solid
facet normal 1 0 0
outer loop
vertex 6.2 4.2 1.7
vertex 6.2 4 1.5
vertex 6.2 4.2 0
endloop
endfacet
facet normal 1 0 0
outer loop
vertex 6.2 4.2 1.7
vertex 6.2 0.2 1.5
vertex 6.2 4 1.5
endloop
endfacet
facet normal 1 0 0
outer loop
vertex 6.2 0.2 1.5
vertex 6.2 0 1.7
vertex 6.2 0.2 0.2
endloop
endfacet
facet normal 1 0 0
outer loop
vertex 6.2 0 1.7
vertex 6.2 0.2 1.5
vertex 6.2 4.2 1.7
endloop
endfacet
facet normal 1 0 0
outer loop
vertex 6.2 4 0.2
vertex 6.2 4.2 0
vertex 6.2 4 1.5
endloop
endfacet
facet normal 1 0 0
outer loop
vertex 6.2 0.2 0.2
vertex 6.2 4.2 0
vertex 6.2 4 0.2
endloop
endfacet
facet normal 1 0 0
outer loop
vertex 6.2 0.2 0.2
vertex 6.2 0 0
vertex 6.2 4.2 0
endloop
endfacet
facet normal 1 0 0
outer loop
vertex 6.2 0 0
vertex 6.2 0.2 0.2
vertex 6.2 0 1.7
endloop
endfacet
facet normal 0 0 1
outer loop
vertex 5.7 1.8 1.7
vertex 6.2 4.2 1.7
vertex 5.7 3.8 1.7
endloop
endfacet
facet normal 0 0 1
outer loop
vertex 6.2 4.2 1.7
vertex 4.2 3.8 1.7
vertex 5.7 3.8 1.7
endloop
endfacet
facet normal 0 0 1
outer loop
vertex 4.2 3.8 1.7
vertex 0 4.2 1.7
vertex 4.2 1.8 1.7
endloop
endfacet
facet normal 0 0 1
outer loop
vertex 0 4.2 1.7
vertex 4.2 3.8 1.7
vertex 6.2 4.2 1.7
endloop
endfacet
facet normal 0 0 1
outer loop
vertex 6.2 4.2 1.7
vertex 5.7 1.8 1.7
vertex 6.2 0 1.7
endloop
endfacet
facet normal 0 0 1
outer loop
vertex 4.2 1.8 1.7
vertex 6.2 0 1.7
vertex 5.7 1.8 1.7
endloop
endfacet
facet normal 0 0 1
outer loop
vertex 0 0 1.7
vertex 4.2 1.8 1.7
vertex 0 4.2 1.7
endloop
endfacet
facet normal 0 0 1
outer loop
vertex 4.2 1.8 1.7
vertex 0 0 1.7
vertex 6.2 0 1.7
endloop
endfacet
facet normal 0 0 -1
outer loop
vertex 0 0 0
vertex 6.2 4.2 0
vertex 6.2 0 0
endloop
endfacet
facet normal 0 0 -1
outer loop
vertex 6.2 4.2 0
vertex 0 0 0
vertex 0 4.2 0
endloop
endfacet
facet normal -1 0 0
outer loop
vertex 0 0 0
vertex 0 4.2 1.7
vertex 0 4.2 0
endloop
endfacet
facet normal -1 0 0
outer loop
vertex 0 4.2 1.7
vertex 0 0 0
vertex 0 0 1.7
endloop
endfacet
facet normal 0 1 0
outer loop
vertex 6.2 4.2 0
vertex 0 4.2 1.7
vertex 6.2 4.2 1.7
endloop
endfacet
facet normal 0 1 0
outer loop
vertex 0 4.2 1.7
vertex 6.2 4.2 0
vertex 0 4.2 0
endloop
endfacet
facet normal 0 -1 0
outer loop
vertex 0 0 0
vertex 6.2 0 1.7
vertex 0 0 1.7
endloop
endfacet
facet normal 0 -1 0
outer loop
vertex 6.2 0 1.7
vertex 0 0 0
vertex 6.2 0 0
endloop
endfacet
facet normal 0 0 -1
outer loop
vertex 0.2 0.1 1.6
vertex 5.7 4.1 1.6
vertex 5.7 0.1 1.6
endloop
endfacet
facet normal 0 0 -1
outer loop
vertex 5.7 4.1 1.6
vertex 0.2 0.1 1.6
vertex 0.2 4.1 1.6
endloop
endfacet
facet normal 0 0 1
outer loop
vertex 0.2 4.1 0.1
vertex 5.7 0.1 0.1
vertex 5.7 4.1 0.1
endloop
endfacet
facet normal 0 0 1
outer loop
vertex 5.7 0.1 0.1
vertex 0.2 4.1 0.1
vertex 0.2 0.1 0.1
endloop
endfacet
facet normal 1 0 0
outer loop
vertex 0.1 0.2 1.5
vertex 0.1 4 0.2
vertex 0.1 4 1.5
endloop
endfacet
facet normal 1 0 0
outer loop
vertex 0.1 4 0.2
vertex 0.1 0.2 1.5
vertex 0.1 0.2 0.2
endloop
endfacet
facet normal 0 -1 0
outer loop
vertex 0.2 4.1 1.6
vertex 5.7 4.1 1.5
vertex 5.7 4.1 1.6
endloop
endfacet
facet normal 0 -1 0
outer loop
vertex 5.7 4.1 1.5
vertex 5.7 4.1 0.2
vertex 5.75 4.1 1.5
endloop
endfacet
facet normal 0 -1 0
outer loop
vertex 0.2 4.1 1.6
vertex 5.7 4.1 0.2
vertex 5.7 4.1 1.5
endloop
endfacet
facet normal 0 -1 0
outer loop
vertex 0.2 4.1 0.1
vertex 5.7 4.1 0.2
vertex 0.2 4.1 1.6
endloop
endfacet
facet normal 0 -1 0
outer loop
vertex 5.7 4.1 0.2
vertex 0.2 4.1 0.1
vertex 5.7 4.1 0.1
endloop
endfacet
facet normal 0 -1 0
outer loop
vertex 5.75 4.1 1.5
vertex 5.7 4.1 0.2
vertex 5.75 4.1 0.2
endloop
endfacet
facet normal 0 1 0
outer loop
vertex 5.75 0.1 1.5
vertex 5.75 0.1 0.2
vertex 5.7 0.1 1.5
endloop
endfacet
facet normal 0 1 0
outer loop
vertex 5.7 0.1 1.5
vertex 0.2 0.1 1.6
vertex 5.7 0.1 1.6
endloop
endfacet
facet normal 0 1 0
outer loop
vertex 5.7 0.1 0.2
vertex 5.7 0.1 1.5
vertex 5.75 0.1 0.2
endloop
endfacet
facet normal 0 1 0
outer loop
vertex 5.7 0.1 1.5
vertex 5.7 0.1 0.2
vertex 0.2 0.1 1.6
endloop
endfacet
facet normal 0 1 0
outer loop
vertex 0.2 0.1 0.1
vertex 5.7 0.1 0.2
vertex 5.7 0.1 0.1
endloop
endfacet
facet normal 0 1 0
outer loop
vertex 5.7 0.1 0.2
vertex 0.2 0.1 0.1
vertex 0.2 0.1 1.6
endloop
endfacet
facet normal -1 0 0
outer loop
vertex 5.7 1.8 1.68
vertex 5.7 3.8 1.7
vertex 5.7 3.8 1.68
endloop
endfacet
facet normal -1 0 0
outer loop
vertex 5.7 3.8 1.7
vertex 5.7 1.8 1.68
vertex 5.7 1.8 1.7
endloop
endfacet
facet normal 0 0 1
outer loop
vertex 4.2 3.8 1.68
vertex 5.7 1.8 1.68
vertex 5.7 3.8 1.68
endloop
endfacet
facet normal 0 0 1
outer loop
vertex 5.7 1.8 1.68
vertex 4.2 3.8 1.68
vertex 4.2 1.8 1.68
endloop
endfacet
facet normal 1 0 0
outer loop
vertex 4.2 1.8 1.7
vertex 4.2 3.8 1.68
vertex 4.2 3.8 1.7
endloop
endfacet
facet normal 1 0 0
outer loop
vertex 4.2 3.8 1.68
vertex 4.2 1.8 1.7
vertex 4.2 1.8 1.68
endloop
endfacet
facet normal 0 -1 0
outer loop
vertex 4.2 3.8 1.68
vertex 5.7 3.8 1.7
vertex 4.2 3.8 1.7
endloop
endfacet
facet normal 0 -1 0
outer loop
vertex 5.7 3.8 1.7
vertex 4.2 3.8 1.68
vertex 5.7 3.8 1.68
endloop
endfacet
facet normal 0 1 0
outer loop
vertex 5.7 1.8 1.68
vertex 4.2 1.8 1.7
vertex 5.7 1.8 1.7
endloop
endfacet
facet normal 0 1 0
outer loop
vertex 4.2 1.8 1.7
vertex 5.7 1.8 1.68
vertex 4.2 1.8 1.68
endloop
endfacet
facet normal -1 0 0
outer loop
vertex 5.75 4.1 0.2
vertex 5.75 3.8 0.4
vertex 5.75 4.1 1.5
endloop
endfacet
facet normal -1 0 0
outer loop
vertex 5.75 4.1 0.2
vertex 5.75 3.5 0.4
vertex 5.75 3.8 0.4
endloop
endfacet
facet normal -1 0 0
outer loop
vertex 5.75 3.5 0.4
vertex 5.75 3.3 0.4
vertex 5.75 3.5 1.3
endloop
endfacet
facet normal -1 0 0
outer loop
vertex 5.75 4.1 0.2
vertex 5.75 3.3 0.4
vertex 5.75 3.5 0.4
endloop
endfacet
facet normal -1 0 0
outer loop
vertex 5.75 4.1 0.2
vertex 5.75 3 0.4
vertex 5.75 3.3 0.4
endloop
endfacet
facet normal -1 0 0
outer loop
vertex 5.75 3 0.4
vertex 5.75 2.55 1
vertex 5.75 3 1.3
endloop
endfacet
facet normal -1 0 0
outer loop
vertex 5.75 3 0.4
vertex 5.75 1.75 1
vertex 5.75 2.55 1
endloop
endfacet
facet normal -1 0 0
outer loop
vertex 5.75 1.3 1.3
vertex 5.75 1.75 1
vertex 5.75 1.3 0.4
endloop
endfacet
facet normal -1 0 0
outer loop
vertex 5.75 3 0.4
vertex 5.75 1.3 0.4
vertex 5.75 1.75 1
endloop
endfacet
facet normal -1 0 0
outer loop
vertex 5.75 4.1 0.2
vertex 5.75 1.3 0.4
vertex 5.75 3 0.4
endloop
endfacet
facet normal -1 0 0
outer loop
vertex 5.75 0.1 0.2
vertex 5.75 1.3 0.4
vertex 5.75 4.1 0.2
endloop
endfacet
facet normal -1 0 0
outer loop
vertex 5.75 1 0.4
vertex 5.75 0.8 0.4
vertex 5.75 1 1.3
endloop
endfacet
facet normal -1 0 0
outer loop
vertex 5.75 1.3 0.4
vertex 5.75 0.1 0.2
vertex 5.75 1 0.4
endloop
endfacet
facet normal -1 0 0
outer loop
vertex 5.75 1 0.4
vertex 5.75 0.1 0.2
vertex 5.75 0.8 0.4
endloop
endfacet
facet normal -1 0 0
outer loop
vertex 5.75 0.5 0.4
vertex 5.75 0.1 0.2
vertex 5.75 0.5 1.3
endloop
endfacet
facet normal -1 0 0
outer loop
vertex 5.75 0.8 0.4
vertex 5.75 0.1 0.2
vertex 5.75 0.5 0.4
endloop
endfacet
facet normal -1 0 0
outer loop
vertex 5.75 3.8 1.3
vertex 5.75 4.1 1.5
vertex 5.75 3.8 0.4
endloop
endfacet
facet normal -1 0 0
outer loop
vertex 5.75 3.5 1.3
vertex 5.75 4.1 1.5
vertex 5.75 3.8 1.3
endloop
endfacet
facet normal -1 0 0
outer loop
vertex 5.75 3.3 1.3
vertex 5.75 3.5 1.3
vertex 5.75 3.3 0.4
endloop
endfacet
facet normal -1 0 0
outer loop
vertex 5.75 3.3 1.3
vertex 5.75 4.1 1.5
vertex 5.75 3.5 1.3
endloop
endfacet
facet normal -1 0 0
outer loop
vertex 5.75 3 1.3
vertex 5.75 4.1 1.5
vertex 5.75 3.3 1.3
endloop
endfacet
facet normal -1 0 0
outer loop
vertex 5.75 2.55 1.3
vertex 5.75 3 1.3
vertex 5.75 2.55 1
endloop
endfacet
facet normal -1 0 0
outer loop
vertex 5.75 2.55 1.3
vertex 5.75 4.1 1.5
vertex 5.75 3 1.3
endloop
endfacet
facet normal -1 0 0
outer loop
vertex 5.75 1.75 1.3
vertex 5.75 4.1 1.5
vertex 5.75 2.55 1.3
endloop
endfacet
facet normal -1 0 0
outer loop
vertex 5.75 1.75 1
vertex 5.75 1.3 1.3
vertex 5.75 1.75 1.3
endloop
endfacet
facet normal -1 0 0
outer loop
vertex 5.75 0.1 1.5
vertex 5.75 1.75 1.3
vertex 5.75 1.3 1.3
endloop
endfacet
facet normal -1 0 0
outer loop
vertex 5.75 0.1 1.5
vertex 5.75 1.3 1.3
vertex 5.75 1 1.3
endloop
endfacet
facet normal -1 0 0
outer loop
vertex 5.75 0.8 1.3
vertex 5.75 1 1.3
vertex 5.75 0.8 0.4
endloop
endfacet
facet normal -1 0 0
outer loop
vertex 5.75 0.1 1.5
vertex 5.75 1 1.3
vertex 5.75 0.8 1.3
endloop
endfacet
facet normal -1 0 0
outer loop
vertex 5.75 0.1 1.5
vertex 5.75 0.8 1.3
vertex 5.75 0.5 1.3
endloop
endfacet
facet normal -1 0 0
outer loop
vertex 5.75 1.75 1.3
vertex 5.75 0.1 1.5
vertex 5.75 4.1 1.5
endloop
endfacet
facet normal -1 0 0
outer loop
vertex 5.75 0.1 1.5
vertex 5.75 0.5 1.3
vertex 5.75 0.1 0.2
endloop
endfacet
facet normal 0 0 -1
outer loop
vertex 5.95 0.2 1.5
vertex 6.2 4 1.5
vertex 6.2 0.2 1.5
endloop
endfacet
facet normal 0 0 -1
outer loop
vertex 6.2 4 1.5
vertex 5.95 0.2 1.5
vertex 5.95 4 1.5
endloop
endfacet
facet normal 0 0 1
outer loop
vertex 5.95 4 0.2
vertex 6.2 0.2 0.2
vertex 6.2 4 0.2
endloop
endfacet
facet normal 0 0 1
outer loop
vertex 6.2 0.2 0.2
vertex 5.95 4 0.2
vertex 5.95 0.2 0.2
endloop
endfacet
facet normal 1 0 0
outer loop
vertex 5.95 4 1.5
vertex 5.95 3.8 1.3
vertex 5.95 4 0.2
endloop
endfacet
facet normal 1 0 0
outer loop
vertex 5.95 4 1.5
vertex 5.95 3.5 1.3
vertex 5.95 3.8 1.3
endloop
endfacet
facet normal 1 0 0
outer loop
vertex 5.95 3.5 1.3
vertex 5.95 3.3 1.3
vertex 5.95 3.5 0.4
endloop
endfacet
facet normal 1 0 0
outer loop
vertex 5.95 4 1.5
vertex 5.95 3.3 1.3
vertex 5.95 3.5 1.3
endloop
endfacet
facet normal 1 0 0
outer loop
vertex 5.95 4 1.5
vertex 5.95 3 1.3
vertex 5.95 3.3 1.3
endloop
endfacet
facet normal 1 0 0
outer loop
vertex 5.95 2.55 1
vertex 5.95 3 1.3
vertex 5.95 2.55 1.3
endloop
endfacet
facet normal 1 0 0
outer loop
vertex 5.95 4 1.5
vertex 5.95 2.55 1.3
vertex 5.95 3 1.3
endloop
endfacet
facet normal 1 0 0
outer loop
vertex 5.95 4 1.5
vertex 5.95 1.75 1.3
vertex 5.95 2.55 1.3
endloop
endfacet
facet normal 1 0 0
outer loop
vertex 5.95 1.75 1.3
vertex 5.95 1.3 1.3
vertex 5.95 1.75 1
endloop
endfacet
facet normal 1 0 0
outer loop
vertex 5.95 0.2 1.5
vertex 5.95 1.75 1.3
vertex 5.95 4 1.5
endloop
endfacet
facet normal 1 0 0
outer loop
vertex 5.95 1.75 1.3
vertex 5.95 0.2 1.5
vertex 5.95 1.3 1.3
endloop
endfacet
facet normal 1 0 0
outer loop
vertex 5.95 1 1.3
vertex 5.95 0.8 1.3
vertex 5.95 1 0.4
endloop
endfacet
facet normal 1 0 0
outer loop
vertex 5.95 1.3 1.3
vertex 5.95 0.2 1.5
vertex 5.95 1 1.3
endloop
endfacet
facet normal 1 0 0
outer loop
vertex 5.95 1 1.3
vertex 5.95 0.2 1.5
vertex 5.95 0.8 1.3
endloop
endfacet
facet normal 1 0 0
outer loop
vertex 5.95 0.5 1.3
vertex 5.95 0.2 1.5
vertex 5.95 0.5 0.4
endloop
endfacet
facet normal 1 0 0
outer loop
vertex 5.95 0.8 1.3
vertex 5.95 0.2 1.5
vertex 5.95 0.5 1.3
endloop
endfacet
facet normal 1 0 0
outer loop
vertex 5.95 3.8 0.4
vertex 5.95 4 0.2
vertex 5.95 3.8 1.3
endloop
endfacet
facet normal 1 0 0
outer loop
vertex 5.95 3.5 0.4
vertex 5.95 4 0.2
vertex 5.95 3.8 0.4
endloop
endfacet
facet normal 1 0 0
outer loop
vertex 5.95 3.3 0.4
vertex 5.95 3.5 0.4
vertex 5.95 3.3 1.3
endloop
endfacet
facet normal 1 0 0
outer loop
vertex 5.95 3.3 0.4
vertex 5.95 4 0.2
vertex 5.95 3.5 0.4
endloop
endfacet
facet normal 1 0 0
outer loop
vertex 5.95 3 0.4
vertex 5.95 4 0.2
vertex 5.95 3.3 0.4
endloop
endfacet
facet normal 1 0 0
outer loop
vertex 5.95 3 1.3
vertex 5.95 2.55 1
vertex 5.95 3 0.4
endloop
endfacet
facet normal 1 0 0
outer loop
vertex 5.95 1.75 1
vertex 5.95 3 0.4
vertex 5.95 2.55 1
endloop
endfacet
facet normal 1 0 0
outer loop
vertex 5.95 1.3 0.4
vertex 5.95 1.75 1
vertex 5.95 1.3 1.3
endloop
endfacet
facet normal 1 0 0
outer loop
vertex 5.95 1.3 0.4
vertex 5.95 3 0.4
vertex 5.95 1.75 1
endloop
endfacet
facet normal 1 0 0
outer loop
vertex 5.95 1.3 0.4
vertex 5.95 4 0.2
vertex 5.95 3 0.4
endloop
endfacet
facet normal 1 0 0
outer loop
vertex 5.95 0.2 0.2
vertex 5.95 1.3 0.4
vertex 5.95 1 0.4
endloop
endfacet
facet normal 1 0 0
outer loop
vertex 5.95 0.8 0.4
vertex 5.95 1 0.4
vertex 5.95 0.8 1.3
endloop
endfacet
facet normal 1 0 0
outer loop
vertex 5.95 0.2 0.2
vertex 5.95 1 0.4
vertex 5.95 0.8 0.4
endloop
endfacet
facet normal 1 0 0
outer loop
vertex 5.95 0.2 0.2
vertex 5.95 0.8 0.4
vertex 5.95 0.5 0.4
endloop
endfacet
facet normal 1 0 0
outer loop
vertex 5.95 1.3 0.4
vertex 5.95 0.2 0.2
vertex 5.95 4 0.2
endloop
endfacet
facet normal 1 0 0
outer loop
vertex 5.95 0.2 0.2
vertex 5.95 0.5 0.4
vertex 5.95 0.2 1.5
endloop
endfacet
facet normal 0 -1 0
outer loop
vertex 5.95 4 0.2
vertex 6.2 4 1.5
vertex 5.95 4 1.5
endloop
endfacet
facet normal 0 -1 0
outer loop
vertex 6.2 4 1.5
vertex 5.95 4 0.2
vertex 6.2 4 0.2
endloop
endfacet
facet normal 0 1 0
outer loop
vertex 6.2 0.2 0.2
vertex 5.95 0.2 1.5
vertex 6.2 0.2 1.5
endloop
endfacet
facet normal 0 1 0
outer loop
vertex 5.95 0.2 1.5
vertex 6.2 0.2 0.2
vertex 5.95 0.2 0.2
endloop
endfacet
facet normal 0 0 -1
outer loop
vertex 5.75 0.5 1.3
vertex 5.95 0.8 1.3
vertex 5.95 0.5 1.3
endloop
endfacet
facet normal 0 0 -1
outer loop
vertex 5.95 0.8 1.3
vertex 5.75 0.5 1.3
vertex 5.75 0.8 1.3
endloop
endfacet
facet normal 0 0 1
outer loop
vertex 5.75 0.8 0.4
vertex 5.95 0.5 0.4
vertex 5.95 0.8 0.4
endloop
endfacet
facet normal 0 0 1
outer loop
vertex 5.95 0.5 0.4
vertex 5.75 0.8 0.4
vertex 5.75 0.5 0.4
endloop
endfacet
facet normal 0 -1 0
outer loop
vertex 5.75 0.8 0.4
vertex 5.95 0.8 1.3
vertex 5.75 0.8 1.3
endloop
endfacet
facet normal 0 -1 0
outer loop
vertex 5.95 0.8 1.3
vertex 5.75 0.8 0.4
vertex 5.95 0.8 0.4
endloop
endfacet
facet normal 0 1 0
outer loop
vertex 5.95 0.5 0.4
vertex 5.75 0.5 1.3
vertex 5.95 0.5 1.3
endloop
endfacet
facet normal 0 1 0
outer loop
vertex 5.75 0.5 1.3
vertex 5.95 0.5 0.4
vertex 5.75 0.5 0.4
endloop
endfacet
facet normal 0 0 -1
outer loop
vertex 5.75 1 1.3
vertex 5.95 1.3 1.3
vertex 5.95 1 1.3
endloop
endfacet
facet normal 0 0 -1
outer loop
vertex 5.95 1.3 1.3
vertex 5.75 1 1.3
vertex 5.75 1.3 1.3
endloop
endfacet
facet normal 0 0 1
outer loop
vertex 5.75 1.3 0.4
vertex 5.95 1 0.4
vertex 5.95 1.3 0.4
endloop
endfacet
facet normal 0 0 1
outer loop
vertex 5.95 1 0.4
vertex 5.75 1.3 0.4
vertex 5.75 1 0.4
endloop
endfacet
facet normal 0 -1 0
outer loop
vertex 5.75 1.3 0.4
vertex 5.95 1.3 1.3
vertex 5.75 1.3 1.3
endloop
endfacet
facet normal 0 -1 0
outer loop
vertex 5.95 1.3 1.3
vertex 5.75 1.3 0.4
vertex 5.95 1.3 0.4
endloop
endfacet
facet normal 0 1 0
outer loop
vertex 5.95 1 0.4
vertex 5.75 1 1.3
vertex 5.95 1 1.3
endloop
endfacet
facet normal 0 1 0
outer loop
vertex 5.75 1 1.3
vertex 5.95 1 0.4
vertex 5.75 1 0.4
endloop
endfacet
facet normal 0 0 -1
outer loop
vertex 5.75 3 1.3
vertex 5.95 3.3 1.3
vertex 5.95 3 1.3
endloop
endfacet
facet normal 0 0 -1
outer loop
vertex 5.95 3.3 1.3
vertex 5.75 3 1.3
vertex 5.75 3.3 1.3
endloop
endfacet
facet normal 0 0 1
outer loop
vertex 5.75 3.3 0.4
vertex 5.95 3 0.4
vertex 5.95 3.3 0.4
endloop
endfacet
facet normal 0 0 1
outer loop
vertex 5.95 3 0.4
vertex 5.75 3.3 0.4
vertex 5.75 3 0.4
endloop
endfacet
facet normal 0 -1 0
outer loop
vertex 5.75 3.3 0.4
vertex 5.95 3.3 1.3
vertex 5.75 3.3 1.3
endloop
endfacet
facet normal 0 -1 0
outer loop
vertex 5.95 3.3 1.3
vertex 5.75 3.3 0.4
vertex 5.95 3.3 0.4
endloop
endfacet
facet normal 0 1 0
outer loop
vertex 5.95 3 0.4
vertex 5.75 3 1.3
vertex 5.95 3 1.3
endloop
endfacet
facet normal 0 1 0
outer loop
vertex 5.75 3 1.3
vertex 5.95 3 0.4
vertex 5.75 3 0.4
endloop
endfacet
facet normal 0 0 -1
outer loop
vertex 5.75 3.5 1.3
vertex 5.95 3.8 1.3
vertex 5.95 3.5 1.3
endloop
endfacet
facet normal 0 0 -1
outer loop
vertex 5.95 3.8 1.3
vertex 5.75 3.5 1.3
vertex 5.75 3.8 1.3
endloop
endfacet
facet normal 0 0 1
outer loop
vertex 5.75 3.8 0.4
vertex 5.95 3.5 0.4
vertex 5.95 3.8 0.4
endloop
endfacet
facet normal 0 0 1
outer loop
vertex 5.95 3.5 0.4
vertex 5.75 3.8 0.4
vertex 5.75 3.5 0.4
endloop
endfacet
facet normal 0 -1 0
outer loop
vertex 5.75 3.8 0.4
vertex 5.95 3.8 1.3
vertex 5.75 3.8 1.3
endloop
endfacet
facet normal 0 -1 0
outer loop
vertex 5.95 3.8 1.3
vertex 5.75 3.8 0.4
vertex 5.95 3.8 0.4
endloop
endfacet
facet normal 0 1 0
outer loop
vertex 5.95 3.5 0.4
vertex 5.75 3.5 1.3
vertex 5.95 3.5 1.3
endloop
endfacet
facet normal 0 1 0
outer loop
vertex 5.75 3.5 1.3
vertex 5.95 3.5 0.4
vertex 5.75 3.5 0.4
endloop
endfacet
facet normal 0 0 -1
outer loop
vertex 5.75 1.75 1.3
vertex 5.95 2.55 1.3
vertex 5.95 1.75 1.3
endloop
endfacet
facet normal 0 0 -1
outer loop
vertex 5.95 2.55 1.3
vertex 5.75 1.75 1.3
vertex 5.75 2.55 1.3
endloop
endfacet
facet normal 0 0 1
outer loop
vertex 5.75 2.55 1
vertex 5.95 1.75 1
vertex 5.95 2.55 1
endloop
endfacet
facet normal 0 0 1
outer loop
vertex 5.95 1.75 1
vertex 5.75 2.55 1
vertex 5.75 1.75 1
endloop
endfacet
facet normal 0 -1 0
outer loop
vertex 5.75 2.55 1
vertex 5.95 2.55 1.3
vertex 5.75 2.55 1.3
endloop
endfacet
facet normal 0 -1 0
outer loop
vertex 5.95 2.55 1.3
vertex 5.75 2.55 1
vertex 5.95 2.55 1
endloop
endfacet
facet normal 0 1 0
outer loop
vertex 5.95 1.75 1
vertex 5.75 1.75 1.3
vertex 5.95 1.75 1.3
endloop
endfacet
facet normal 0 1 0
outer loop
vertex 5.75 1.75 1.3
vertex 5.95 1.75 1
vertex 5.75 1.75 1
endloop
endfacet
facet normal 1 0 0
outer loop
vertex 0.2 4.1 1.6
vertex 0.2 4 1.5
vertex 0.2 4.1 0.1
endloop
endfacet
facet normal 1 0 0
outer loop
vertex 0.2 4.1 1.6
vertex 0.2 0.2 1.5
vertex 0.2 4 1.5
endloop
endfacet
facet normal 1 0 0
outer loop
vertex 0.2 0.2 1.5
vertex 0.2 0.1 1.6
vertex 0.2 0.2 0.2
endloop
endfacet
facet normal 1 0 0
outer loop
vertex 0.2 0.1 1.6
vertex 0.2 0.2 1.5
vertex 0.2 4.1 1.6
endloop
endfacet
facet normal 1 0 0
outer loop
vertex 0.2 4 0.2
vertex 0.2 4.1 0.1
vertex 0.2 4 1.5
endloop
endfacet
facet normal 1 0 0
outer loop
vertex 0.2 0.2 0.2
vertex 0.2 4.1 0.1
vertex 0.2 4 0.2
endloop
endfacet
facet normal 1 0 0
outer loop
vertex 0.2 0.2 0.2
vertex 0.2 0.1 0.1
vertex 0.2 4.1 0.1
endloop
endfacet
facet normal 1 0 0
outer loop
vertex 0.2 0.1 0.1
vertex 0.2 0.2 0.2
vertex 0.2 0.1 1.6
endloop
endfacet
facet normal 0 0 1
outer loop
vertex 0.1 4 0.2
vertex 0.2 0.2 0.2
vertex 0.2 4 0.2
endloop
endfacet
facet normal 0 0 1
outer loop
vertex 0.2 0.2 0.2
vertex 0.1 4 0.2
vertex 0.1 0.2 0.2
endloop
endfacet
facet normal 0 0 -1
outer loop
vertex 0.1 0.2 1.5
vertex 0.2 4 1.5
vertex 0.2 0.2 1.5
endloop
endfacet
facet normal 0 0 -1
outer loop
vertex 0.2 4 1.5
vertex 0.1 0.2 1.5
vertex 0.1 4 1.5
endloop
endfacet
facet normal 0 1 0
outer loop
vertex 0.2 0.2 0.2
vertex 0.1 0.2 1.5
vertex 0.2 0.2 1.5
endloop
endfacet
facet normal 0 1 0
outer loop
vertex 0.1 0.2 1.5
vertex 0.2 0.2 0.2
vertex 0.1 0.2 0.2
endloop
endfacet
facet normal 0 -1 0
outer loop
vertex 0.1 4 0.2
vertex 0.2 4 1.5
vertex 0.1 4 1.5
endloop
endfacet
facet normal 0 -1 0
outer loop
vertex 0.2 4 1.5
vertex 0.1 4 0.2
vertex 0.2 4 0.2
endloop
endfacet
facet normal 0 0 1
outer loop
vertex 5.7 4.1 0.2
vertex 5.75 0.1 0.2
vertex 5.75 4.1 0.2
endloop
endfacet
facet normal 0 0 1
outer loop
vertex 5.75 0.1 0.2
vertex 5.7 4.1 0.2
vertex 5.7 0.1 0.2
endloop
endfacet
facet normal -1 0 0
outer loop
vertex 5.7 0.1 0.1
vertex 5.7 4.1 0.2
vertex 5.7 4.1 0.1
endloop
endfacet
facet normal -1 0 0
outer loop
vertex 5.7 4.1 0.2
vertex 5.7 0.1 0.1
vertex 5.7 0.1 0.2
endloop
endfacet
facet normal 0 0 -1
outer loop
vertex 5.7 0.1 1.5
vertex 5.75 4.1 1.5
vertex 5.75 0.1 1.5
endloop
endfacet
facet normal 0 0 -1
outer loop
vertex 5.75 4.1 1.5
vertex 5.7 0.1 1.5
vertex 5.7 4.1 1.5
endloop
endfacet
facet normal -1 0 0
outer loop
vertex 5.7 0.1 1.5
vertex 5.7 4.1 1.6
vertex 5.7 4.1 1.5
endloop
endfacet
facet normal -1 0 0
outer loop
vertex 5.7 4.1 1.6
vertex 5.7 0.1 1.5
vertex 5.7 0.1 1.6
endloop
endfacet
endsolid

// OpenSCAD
//NodeMCU智能设备，盒子，防雨淋型(垂直安装)
//Author:openthings@163.com，
//copyright 2015-2025.
//打印时注意比例变化，并且旋转向上。
//避免上部打印时无支撑塌陷。
//盖子单独打印，或放为两个模型。

//常量定义
athick=0.5;	//盖子厚度
bthick=0.10;	//盒壁厚度
bwidth=4.0;	//内径净宽
bhight=1.5;	//内径净高

blong_inter=5.5;//内径净长
//外径长度＝底厚＋内径＋挡格＋盖子厚度
blong=bthick+blong_inter+bthick+athick;

//文字或图标标识
//translate([-2,0,0])
//scale([1, 1, 0.1])
//  surface(file = "smiley.png", center = true);

//======================================
//盒子体，采用挖空切割方式造型。
difference() {
	//外盒
	translate([0,0,0])
	{	color([0.8,0.8,0.8])
		cube([blong,bwidth+bthick*2,
			bhight+bthick*2]);
	}
	//内盒，挖空。
	translate([bthick,bthick,bthick])
	{	color([0.2,0.8,0.8])
		cube([blong+1,bwidth,bhight]);
	}
	//底部，凹陷标识，可贴标签。
	translate([blong-2,1.8,bhight+bthick+0.08])
	{	color([0.6,0.6,0.6])
		cube([1.5,bwidth*0.5,0.1]);
	}
}

//底部加强，在内部形成边角挡格。
	translate([bthick,bthick,bthick])
	{	color([0.2,0.5,0.2])
		cube([bthick,bwidth,bthick]);
	}
	translate([bthick,bthick,bhight])
	{	color([0.2,0.5,0.2])
		cube([bthick,bwidth,bthick]);
	}
	translate([bthick,bthick,bthick])
	{	color([0.2,0.5,0.2])
		cube([bthick,bthick,bhight]);
	}
	translate([bthick,bwidth,bthick])
	{	color([0.2,0.5,0.2])
		cube([bthick,bthick,bhight]);
	}

//盖子挡格。
	translate([blong-athick,bthick,bthick])
	{	color([0.2,0.5,0.2])
		cube([bthick,bwidth,bthick]);
	}
	translate([blong-athick,bthick,bhight])
	{	color([0.2,0.5,0.2])
		cube([bthick,bwidth,bthick]);
	}

//======================================
//盖子，单独打印。嵌入盒子内部，注意留公差。
translate([5.75,0.0,0]){
//translate([0,0,2]){
difference() {
	//盖子，挖空。
	translate([0,bthick,bthick])
	{	color([0.5,0.5,0.5])
		cube([athick-0.05,bwidth,bhight]);
	}
	translate([0.2,bthick*2,bthick*2])
	{	color([0.6,0.3,0.8])
		cube([athick+1,bwidth-bthick*2,
				bhight-bthick*2]);
	}

	//通风口，挖空。================
	//左侧出风口
	translate([-0.1,0.5,0.4])
	{	color([1,0.8,0.8])
		cube([0.8,0.3,0.9]);
	}
	translate([-0.1,1,0.4])
	{	color([1,0.8,0.8])
		cube([0.8,0.3,0.9]);
	}
	//右侧进风口
	translate([-0.1,3,0.4])
	{	color([1,0.8,0.8])
		cube([0.8,0.3,0.9]);
	}
	translate([-0.1,3.5,0.4])
	{	color([1,0.8,0.8])
		cube([0.8,0.3,0.9]);
	}
	//USB接口，挖空。
	translate([-0.1,1.75,1.0])
	{	color([1,0.8,0.8])
		cube([0.8,0.8,0.3]);
	}
}
}
